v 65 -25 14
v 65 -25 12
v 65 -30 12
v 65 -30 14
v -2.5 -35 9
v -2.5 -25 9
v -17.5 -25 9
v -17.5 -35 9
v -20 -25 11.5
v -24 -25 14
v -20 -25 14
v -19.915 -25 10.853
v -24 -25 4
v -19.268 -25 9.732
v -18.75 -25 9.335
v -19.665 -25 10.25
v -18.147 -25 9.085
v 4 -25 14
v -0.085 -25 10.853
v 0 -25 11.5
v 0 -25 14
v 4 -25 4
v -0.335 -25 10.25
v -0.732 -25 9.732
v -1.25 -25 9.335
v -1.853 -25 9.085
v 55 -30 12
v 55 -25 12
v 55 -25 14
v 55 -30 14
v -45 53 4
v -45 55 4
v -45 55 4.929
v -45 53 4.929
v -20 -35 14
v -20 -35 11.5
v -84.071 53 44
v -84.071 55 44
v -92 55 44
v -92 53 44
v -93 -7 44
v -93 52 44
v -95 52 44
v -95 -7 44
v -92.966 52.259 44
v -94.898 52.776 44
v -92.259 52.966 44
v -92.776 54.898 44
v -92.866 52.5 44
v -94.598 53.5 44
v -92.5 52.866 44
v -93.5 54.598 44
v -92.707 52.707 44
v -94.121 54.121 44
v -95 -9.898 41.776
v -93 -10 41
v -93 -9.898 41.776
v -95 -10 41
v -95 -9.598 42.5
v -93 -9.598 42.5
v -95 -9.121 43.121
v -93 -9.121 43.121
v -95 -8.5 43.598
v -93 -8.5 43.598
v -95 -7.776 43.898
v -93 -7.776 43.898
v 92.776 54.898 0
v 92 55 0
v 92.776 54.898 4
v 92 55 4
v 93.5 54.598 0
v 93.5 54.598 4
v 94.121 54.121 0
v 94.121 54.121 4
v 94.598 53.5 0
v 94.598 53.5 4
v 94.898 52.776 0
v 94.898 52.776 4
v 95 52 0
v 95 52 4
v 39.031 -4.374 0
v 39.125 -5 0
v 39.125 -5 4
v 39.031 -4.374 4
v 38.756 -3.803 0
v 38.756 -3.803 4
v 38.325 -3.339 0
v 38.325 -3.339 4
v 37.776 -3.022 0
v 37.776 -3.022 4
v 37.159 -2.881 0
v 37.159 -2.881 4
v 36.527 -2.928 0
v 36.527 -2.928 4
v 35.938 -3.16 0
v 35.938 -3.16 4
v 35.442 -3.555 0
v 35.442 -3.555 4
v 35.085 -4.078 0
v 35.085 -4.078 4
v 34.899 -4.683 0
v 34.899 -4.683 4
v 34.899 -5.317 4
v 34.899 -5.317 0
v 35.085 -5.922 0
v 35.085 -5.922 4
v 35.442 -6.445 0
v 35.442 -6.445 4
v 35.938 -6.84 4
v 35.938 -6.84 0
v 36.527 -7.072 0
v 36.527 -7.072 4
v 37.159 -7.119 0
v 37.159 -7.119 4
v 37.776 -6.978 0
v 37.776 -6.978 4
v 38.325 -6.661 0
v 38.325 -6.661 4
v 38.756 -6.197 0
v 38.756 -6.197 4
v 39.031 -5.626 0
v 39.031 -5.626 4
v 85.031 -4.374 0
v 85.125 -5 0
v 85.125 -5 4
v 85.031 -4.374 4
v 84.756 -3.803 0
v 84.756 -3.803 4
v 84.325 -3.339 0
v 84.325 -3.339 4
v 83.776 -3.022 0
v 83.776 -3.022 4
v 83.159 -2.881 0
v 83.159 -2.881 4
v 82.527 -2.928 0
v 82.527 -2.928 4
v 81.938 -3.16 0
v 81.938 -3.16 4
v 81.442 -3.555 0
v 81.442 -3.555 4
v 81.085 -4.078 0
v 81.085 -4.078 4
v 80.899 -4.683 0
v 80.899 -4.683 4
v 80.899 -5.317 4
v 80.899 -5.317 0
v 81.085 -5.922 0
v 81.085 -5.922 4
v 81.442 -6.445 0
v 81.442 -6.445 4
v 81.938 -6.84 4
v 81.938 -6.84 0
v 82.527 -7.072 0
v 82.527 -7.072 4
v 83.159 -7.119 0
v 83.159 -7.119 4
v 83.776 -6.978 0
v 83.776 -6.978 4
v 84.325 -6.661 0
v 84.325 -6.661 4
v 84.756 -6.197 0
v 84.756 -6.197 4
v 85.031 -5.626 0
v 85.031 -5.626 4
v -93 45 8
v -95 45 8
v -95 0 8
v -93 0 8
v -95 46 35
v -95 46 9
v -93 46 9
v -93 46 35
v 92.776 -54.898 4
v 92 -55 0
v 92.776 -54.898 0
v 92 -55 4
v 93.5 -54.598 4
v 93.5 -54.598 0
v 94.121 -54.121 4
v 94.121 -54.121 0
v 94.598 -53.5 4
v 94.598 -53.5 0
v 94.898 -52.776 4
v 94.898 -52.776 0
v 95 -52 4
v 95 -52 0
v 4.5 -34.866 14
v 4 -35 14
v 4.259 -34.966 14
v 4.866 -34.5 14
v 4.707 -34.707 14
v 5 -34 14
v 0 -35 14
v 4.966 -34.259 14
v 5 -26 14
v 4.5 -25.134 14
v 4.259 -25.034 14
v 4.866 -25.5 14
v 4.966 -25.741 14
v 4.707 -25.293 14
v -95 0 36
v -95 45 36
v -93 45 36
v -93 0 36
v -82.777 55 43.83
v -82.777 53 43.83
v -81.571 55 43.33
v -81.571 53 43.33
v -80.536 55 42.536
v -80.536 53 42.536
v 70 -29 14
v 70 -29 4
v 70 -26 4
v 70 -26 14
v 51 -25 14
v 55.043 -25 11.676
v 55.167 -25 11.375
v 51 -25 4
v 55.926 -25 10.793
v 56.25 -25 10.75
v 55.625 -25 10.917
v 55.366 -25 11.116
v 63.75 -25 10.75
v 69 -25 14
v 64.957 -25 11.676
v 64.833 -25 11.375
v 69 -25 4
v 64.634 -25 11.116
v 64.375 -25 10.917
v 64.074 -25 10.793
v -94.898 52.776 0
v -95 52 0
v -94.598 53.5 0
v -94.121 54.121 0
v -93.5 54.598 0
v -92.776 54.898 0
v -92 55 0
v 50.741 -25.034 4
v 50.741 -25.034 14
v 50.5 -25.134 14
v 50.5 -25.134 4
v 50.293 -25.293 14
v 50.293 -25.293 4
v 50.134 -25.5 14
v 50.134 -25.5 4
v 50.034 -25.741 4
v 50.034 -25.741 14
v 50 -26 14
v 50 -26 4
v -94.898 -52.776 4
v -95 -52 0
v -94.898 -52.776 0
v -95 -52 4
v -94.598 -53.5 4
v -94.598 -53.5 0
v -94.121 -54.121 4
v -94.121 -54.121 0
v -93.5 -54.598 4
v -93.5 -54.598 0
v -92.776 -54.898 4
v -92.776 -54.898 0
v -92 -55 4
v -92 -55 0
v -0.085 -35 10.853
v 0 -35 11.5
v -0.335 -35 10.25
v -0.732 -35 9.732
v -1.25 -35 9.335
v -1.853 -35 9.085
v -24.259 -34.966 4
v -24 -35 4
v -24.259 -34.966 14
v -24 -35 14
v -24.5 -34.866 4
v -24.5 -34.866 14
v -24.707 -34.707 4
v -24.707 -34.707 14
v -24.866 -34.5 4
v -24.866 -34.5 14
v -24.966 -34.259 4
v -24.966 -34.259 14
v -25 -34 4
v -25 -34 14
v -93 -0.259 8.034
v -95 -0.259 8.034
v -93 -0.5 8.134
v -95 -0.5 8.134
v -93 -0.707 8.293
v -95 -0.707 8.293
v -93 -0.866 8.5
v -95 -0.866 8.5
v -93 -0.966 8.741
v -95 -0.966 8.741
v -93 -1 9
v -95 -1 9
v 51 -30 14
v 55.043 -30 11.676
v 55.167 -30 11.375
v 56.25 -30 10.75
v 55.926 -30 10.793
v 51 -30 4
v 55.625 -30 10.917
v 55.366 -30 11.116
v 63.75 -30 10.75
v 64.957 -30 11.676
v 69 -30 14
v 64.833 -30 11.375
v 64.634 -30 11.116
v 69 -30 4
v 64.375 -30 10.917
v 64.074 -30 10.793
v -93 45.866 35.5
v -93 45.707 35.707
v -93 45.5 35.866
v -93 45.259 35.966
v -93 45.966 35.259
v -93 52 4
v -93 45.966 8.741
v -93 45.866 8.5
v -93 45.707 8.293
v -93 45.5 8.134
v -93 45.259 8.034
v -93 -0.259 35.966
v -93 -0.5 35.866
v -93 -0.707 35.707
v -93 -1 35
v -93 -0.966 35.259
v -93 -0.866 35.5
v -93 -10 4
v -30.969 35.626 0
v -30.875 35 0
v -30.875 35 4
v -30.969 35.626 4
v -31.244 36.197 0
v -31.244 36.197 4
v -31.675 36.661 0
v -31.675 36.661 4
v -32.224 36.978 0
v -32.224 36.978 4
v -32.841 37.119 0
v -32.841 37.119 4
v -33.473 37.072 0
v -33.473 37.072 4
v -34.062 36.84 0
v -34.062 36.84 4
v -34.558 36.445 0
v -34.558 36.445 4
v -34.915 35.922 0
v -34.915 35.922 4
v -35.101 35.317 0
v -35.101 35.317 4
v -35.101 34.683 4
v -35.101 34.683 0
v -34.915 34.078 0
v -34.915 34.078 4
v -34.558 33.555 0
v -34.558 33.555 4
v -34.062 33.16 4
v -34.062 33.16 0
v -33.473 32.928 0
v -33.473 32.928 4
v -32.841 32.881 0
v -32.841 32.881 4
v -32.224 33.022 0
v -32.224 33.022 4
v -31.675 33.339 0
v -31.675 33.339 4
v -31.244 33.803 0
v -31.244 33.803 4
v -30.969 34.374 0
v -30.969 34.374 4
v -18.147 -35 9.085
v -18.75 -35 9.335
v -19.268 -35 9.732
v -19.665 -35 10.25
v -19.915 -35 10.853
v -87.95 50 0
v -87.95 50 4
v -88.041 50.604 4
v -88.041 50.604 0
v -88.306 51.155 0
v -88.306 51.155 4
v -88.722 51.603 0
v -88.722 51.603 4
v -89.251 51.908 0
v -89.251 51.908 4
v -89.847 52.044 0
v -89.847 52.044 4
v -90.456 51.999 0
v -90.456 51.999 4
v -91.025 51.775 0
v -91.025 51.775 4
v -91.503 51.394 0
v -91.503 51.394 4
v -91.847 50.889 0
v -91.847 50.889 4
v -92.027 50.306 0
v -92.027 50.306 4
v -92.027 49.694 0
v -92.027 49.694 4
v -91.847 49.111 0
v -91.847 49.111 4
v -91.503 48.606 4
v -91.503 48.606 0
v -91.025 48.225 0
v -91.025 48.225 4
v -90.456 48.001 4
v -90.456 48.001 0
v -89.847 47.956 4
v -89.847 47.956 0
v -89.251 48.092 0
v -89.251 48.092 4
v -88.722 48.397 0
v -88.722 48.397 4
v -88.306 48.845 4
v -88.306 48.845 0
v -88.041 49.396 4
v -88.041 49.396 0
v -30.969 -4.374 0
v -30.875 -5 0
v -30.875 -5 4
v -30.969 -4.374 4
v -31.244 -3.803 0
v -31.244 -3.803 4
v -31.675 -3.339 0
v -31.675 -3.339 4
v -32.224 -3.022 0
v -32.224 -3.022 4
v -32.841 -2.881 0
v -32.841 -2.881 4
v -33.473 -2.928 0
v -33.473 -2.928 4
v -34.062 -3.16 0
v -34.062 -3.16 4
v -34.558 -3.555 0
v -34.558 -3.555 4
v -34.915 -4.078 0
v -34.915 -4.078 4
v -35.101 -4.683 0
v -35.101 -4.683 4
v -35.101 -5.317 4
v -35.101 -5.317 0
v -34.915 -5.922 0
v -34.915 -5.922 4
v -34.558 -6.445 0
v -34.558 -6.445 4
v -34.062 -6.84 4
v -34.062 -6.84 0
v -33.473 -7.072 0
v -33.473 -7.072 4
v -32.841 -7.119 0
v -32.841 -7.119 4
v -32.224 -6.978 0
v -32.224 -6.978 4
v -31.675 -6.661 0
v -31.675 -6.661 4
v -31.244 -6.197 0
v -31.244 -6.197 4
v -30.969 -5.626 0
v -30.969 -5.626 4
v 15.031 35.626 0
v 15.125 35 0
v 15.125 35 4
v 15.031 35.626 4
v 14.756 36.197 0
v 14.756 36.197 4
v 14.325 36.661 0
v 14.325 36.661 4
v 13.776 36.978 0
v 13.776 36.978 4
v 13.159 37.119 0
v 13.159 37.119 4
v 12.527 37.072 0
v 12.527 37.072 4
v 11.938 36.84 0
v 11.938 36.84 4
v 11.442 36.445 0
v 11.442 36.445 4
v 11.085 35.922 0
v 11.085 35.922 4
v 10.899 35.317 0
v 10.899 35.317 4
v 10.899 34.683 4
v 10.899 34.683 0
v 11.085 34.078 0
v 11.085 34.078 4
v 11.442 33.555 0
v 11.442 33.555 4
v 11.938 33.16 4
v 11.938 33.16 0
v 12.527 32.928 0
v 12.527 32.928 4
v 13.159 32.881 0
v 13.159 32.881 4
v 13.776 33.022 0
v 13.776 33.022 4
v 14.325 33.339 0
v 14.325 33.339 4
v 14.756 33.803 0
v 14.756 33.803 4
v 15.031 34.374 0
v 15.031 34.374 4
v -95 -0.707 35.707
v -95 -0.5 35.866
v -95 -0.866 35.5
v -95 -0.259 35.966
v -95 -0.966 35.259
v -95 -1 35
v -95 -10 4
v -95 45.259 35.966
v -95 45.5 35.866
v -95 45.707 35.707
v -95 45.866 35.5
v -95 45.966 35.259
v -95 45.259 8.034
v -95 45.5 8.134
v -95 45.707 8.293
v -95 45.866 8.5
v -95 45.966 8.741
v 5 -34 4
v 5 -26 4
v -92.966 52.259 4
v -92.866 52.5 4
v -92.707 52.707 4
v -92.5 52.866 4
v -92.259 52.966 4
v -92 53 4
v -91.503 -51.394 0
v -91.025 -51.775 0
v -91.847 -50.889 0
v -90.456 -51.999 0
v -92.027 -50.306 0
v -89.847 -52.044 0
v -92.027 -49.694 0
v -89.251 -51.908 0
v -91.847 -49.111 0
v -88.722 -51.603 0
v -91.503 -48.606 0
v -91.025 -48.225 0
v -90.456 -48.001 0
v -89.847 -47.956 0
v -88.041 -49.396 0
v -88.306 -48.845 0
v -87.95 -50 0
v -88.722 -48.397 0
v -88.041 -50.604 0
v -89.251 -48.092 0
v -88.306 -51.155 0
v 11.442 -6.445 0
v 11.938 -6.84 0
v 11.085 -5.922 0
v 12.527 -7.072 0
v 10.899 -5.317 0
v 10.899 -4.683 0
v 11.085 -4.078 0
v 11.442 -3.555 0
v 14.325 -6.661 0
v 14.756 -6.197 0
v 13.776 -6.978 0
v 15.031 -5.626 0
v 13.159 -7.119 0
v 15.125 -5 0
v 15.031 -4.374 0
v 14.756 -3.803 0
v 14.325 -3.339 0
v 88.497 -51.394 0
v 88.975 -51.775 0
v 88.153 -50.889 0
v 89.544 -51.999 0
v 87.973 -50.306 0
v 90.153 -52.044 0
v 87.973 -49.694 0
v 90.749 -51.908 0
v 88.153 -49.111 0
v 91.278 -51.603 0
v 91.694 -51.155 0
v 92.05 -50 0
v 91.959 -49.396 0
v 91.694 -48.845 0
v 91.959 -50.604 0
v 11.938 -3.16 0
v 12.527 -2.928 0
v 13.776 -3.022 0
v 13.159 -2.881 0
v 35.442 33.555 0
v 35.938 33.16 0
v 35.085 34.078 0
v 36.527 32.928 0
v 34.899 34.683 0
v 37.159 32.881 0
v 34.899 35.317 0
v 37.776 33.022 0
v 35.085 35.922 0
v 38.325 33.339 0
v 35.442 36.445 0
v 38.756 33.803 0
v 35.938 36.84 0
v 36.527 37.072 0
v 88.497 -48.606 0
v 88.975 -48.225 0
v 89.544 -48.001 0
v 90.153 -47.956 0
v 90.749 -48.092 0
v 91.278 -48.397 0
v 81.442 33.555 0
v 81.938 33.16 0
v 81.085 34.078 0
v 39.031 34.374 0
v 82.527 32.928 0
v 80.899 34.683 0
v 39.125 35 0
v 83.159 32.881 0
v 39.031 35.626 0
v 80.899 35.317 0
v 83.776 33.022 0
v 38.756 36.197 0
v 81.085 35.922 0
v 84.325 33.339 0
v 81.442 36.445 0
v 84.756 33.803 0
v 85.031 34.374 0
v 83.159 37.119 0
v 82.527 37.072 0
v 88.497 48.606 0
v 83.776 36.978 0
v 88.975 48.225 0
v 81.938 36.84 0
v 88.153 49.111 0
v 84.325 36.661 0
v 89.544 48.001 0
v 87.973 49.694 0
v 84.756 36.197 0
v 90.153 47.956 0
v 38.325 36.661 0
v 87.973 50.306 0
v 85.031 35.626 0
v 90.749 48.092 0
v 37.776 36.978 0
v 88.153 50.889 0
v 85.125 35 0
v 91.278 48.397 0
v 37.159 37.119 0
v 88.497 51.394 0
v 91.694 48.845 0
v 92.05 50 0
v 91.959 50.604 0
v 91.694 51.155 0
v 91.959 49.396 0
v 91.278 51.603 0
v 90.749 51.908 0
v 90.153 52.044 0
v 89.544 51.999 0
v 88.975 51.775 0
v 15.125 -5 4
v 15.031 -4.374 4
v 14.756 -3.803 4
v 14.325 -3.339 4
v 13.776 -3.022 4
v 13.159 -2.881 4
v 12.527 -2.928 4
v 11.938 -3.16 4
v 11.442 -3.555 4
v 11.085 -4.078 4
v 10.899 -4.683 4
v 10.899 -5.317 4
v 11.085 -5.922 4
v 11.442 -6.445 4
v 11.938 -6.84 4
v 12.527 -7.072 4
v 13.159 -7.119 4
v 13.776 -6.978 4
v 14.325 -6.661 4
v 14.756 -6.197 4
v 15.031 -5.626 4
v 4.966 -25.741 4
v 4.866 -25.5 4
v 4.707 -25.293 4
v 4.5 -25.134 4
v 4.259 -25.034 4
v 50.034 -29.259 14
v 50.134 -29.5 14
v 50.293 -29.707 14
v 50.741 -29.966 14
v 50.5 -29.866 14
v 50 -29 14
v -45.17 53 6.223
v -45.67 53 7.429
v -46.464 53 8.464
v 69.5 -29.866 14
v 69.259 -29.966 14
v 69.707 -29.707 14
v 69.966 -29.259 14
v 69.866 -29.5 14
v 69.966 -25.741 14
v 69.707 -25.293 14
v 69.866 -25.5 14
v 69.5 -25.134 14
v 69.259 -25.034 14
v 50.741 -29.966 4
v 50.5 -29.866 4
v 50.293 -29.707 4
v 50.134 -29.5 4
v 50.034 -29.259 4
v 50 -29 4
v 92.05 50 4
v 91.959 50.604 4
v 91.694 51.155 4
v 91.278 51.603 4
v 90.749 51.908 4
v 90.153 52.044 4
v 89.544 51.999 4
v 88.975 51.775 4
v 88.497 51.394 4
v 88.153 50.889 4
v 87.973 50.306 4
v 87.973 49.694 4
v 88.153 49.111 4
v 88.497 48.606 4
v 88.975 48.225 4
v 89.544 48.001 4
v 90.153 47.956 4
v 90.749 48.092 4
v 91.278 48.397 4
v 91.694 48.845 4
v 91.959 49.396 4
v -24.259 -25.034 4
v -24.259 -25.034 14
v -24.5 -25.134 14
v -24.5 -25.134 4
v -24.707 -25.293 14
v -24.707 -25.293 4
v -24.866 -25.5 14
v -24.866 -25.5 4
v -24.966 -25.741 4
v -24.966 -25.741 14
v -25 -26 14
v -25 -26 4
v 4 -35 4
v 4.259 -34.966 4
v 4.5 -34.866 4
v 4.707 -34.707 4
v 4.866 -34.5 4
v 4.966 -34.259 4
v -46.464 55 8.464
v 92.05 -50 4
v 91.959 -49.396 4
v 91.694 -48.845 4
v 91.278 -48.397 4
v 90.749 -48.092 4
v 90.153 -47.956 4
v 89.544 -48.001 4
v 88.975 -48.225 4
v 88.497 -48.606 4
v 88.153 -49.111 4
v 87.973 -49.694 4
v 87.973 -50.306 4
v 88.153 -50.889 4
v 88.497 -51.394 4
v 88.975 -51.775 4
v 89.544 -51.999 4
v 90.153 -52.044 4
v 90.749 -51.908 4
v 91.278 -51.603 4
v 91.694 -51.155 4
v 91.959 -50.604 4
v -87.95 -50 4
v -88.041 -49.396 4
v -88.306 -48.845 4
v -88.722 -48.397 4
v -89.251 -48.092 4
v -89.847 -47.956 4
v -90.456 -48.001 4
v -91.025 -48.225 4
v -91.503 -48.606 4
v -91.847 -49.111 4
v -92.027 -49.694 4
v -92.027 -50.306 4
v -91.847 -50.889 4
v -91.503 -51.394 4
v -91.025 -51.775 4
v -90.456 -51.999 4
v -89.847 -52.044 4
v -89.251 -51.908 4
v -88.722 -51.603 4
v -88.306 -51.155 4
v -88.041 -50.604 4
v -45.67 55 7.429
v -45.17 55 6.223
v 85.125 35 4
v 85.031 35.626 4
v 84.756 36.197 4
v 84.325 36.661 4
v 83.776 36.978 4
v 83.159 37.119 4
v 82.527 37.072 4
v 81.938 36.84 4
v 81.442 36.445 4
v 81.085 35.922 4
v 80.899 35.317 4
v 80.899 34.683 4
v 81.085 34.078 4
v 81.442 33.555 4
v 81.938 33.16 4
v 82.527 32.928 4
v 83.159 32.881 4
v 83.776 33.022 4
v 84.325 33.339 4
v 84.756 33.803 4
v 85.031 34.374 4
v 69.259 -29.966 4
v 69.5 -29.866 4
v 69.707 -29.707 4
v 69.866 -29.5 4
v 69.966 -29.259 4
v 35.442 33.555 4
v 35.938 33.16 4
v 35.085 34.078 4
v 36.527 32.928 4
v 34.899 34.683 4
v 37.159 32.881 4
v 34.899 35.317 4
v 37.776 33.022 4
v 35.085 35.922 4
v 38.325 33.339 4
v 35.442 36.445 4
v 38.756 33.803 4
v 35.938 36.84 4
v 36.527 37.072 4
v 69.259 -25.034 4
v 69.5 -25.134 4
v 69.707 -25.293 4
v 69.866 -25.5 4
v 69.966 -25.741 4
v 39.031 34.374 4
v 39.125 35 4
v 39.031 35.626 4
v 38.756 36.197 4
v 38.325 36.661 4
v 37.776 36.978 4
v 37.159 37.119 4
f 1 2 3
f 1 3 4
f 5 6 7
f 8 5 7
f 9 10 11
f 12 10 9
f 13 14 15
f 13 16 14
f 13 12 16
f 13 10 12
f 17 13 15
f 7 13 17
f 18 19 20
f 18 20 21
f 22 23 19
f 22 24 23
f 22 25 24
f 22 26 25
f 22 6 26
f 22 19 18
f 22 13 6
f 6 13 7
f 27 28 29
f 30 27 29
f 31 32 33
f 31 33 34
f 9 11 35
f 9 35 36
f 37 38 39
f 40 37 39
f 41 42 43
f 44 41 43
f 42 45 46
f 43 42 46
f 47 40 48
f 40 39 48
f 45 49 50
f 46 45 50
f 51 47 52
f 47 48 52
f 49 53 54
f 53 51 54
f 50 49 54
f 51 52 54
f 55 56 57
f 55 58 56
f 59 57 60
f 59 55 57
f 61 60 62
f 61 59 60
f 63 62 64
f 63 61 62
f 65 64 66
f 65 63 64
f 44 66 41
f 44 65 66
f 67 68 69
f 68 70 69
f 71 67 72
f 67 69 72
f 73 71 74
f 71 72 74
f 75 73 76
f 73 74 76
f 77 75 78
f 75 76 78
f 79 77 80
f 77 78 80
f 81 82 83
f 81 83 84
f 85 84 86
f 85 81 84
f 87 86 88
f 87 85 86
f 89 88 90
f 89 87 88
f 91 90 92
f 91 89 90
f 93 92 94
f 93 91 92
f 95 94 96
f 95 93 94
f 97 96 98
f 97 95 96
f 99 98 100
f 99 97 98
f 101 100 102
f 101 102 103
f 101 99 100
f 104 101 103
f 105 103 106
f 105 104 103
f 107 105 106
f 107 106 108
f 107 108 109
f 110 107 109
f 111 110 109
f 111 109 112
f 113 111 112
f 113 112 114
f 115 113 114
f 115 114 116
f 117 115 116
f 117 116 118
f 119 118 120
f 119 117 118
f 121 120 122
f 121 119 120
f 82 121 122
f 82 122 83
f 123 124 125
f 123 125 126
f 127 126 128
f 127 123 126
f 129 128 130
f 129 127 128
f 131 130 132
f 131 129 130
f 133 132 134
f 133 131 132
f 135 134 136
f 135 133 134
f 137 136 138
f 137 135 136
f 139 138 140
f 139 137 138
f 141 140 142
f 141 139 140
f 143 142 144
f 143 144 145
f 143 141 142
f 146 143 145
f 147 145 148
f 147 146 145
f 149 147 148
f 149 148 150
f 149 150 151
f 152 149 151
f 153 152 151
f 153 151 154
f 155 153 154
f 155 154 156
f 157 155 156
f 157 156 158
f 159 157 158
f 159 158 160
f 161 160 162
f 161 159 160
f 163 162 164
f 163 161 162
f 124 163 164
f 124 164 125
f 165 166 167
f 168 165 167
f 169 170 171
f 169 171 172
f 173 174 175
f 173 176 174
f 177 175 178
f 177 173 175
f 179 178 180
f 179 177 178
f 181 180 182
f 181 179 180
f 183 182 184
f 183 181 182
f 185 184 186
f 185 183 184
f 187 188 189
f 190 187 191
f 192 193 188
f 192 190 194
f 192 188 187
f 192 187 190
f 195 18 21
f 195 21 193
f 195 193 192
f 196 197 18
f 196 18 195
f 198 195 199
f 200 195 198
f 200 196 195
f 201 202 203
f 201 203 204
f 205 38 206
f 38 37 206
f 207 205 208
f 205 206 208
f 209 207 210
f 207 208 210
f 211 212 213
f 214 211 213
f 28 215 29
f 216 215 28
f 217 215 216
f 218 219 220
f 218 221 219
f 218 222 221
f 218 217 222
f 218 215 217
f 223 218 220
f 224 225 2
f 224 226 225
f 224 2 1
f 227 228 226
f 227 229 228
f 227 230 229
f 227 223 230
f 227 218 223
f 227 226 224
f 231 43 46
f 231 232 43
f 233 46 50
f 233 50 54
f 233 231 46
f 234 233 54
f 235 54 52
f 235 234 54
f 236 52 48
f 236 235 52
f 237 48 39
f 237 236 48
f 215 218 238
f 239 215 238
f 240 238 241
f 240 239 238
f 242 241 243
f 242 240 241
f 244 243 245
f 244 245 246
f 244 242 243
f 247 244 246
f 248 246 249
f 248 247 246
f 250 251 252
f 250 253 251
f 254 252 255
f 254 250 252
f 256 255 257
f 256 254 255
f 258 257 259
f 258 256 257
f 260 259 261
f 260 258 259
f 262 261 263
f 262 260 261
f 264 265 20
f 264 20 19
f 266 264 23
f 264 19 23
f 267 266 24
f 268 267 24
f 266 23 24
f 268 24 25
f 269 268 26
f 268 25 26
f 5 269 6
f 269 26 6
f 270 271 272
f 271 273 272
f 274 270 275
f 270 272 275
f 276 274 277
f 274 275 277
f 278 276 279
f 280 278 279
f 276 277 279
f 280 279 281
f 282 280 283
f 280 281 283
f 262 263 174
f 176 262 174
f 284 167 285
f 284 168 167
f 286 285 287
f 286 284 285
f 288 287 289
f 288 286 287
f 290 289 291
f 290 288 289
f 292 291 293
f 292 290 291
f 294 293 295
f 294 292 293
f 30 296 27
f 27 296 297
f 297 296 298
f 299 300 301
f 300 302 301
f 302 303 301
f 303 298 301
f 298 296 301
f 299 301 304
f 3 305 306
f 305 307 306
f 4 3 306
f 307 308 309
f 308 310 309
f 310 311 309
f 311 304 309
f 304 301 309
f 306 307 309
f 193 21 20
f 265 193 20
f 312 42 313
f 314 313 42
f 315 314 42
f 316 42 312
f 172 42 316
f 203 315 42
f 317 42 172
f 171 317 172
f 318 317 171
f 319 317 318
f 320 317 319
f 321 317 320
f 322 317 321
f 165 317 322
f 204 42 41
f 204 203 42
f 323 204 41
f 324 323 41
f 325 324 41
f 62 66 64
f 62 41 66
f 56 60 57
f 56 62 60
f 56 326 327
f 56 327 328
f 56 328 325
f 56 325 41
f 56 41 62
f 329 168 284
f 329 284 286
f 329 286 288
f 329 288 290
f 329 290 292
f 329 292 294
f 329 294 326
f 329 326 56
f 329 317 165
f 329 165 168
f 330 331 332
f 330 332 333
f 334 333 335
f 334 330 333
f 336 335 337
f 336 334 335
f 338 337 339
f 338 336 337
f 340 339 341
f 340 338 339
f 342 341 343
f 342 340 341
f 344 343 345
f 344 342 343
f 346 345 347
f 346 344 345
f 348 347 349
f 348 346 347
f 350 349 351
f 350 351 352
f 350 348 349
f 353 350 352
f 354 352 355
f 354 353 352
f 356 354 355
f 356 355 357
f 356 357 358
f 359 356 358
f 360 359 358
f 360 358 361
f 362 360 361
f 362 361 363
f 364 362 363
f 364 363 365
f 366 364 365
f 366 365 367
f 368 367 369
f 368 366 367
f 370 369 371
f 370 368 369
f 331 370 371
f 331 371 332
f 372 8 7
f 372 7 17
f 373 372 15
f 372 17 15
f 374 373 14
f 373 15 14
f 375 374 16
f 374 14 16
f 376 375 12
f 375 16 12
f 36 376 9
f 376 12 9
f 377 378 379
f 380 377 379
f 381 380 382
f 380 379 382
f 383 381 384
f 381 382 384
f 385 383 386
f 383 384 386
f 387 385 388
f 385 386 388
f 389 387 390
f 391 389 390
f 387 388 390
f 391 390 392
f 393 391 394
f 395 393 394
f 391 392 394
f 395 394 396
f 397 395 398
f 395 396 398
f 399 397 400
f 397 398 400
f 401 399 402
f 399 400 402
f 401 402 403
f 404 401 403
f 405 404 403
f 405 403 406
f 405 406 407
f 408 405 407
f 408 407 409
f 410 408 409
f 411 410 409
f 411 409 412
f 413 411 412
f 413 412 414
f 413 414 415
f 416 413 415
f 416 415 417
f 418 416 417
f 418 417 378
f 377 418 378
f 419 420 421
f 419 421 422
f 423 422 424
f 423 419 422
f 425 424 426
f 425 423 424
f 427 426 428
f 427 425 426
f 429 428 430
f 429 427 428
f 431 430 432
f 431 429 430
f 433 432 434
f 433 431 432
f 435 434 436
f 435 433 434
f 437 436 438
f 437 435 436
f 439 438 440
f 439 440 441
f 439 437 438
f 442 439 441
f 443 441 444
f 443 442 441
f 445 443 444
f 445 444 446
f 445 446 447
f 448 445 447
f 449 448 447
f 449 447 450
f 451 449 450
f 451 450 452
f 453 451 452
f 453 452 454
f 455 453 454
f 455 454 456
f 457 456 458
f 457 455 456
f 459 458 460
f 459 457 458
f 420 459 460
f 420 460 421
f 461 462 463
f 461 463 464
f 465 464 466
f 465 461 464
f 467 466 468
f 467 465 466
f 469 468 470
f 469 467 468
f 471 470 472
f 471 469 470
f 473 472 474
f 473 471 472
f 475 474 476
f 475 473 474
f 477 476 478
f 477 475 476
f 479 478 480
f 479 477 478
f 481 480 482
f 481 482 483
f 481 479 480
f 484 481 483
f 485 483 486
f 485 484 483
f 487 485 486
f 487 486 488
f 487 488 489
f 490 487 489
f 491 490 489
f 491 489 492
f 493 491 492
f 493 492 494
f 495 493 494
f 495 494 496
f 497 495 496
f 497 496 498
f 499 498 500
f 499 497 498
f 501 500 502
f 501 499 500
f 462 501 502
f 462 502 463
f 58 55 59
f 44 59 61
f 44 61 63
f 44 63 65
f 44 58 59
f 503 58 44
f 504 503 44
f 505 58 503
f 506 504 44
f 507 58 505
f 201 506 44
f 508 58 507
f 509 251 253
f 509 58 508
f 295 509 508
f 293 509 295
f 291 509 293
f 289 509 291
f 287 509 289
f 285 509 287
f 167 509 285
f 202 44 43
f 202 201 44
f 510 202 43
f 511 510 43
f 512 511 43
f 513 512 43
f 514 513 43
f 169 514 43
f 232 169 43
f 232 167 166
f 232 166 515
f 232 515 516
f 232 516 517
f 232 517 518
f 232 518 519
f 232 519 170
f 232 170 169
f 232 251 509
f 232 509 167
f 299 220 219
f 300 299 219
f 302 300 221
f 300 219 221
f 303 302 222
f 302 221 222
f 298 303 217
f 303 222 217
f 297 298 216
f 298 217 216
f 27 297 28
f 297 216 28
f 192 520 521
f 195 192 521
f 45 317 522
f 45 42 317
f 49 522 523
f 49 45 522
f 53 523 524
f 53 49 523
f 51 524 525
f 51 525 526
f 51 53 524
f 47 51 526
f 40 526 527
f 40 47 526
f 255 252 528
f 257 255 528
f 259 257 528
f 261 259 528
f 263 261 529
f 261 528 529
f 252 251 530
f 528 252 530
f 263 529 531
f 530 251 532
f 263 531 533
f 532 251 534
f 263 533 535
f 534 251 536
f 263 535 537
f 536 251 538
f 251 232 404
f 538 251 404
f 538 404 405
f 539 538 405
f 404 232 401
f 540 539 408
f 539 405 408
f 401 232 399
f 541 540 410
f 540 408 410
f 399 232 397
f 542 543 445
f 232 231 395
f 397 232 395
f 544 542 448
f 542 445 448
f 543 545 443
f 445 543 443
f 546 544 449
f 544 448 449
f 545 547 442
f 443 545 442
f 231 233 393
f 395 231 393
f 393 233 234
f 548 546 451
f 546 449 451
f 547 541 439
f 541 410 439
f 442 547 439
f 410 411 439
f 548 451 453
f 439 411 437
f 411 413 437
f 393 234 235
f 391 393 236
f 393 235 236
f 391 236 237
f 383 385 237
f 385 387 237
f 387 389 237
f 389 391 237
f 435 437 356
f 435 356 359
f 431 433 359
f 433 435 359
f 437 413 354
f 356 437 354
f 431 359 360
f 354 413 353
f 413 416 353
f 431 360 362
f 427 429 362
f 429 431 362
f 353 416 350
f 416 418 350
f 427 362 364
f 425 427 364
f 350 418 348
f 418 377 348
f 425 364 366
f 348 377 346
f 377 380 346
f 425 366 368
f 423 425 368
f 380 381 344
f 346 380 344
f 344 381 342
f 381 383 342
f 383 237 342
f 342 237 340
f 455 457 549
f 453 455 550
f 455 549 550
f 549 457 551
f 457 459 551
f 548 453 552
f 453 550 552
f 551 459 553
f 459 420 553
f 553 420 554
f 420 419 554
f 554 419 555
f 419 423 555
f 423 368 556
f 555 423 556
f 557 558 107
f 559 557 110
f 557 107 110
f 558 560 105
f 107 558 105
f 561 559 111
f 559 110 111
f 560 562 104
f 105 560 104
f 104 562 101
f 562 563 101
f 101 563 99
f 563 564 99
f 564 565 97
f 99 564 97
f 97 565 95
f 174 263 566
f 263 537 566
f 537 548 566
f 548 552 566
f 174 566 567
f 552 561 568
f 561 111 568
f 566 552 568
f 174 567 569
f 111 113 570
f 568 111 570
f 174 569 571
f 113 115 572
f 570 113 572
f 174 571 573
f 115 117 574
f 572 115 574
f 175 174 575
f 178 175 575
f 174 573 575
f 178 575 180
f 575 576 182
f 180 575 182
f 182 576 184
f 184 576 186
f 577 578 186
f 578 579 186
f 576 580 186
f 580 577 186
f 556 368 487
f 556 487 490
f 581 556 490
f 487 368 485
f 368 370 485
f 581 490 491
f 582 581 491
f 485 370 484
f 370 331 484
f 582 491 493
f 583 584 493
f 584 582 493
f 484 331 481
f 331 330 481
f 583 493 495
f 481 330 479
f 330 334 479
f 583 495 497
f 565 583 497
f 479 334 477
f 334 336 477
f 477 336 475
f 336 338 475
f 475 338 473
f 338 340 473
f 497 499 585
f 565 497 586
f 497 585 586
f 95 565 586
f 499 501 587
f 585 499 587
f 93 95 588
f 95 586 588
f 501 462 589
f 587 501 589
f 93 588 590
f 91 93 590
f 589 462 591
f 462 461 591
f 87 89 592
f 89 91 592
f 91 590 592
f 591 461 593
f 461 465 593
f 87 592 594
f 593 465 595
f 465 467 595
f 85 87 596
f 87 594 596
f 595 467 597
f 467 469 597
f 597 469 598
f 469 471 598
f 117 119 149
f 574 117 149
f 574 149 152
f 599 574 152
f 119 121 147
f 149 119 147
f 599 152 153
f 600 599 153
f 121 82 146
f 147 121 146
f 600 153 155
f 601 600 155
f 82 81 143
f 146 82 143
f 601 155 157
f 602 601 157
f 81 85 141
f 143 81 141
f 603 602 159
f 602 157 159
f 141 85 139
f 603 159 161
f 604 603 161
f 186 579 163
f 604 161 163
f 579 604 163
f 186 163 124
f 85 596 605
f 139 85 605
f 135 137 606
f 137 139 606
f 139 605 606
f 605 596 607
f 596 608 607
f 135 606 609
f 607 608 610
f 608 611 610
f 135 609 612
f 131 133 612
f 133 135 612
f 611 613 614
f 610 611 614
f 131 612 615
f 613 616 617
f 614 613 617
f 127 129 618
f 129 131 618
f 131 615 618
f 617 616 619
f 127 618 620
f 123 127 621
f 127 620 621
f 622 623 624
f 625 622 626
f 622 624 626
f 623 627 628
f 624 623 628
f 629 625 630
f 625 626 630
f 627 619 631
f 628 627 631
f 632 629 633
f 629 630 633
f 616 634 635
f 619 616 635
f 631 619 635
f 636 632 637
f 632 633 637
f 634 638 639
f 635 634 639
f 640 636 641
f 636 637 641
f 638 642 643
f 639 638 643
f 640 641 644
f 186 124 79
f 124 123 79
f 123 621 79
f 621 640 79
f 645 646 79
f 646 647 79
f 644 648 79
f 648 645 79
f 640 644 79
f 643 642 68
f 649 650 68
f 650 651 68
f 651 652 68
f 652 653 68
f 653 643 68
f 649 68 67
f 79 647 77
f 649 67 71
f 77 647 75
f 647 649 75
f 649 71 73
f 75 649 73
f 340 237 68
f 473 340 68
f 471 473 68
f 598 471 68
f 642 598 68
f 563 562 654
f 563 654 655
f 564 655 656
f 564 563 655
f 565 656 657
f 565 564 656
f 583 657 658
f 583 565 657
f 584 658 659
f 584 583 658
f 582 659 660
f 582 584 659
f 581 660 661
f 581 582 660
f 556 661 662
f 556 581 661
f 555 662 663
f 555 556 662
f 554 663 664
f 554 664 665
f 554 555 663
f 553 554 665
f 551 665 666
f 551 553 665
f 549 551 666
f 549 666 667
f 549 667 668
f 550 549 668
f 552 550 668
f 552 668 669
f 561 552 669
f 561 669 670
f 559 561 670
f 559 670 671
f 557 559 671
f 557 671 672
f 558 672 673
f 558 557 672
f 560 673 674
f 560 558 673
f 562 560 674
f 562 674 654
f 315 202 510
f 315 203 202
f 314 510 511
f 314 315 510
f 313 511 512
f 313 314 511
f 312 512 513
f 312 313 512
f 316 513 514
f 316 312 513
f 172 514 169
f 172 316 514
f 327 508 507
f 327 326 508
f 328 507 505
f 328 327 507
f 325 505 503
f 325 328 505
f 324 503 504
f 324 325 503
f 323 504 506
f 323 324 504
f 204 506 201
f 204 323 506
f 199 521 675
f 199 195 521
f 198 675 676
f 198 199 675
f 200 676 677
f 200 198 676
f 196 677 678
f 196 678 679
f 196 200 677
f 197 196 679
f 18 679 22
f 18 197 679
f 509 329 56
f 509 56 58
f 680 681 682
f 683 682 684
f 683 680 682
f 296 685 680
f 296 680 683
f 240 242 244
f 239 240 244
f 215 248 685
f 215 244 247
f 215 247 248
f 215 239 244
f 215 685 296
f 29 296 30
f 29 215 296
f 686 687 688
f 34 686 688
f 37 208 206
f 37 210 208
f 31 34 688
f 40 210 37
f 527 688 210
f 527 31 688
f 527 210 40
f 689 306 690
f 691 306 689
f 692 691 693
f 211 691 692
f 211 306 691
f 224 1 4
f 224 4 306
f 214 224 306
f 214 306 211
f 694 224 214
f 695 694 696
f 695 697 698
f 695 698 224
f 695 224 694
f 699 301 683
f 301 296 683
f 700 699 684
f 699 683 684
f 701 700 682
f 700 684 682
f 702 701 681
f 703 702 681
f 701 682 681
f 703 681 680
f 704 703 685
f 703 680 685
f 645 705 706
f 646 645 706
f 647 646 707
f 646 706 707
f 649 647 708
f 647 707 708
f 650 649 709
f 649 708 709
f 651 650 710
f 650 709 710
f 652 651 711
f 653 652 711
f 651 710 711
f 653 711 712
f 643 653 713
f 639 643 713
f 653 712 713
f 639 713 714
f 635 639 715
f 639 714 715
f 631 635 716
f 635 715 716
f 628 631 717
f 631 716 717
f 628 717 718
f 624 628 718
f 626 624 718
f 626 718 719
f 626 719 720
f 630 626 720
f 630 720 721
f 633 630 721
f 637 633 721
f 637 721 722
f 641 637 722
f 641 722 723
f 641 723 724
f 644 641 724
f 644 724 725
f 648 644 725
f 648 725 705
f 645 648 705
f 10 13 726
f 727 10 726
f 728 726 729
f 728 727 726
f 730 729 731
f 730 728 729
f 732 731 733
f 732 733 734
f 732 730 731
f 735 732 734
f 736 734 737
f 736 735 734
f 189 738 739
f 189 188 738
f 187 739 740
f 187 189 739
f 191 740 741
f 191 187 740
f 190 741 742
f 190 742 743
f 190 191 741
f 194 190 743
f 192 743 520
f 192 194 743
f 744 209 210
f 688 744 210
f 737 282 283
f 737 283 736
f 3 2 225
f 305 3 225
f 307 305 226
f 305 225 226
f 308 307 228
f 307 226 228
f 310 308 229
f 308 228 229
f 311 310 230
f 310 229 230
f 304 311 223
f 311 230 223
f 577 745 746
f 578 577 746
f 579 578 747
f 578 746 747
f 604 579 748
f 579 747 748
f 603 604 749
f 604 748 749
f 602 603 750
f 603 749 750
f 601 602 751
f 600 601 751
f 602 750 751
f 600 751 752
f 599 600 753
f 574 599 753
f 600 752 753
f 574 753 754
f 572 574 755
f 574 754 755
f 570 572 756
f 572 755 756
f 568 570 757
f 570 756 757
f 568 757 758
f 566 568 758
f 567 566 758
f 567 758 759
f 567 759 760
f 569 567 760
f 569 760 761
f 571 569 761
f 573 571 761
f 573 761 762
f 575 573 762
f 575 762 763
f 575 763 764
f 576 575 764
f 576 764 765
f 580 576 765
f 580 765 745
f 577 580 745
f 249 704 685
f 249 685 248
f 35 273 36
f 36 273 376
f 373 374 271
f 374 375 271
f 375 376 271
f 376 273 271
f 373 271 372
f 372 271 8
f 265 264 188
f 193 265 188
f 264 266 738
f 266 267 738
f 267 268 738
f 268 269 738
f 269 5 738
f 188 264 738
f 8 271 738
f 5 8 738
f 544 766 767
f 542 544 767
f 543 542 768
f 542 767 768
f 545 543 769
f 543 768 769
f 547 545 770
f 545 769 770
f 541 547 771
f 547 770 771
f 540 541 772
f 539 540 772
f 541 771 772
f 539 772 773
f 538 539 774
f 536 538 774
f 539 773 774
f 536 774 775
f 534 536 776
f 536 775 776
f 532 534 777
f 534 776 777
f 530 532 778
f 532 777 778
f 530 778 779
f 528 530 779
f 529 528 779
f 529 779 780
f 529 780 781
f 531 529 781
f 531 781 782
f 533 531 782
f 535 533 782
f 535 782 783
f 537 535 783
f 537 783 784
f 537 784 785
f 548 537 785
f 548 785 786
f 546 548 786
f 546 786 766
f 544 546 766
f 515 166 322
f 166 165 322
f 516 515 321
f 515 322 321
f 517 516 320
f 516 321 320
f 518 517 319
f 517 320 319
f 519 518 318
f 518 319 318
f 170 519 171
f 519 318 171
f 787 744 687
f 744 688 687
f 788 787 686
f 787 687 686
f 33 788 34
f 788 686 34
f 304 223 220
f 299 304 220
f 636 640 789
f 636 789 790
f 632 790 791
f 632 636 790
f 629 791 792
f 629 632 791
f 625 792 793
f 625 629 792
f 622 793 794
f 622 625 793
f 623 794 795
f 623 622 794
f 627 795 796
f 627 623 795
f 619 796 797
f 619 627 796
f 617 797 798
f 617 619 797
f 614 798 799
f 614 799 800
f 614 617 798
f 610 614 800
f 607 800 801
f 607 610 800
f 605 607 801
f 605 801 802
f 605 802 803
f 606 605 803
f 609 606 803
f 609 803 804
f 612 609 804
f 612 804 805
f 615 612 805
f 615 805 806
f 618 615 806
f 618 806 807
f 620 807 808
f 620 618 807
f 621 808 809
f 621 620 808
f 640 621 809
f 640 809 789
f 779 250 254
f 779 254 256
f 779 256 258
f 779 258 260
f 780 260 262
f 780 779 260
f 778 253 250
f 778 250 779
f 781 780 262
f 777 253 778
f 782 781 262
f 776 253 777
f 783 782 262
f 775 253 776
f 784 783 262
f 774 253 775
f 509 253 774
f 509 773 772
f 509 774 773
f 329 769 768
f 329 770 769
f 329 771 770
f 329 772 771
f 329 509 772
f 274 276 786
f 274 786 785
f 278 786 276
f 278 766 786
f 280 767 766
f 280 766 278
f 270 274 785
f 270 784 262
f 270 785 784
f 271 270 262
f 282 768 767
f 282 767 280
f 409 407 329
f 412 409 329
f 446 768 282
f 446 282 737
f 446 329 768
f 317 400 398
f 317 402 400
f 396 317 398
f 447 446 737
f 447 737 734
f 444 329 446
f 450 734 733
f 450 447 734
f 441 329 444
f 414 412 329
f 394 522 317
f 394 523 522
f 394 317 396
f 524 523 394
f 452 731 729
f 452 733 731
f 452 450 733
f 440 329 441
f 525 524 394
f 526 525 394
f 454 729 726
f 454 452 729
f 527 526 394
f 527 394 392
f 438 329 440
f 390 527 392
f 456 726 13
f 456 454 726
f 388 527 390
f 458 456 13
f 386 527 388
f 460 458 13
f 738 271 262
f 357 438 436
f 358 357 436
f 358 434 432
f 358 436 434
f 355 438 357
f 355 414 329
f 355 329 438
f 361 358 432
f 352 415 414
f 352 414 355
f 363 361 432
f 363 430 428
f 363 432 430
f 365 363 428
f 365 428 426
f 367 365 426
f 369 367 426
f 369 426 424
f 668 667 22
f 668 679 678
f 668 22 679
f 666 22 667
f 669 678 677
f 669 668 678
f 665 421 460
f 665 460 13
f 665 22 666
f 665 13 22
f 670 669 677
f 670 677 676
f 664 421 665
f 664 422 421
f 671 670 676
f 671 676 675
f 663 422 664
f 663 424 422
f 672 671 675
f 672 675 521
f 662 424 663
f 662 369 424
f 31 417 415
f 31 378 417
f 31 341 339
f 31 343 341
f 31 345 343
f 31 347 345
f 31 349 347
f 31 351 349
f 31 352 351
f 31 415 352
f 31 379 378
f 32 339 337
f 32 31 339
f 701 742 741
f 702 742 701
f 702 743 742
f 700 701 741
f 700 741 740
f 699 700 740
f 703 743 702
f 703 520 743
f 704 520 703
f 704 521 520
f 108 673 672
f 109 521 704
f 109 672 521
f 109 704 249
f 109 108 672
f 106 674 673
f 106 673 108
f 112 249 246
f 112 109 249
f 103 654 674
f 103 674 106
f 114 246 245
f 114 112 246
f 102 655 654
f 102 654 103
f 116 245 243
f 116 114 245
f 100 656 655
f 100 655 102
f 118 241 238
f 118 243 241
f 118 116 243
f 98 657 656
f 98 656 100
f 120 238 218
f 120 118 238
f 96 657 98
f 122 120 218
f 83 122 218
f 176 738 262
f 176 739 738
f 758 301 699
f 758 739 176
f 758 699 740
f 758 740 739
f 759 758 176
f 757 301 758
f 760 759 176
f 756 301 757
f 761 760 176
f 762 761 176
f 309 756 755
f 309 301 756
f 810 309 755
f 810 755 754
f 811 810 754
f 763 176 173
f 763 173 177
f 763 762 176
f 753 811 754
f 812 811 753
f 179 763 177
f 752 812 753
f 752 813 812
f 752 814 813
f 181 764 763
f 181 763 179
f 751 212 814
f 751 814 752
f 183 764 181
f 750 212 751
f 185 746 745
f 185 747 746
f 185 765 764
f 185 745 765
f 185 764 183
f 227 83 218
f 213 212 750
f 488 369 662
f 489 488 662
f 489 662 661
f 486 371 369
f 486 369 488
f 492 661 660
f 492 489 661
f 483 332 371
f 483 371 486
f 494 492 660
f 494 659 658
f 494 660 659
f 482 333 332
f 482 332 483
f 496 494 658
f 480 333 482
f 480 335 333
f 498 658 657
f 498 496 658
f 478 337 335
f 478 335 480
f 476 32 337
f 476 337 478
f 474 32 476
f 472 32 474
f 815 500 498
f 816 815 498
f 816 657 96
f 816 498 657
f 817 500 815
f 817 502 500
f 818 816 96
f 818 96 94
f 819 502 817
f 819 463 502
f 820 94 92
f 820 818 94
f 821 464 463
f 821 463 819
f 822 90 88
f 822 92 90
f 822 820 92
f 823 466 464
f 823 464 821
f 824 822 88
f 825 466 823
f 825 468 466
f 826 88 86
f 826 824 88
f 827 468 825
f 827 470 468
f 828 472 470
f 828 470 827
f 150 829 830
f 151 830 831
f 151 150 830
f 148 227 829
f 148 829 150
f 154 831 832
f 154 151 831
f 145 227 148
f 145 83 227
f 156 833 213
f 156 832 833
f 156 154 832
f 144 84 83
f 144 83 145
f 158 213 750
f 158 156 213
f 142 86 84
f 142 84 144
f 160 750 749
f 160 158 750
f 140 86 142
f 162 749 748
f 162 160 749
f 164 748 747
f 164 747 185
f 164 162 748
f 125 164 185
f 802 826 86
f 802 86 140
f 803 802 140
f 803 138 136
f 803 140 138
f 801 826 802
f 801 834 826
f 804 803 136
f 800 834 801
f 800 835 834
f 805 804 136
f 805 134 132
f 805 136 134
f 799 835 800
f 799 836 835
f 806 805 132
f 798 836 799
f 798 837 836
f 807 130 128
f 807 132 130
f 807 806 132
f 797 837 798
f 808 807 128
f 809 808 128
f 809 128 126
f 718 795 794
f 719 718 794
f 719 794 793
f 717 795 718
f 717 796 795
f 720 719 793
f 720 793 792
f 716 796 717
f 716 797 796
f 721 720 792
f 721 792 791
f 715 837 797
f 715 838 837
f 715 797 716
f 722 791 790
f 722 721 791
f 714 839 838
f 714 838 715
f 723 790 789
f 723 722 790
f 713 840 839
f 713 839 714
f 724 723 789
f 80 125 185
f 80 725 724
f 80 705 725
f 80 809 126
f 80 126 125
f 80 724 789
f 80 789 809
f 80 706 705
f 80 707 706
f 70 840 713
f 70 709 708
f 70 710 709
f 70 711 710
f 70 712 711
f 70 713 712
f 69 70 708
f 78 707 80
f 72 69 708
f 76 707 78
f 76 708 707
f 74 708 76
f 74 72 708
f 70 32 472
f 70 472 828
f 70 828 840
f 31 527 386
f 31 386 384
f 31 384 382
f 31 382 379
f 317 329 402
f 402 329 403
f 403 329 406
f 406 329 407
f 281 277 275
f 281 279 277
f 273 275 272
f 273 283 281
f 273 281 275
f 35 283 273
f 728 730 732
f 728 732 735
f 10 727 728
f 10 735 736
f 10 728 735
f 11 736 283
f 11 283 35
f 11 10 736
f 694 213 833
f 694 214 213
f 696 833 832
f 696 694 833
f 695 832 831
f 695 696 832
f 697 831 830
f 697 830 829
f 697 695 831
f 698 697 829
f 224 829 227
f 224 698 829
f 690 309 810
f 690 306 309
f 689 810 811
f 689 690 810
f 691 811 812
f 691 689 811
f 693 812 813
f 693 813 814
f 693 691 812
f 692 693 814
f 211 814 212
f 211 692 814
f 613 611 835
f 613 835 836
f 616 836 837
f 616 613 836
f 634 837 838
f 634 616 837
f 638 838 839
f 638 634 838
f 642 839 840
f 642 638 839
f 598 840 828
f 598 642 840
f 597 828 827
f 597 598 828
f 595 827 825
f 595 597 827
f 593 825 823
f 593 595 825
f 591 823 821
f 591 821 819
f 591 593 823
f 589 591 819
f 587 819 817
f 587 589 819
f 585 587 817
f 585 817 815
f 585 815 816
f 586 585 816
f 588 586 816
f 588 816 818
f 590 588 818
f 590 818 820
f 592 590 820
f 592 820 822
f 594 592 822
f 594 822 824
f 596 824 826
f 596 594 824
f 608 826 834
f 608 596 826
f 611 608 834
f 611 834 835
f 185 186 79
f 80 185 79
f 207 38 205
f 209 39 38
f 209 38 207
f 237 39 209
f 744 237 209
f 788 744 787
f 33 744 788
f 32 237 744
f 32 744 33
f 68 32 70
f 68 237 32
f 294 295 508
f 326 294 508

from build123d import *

# Parameters (mm, degrees)
SKETCH_W        = 190
SKETCH_H        = 110
SKETCH_R        = 2.125
PAD_DEPTH       = 4
PAD001_DEPTH    = 40
SKETCH002_R     = 2.05
POCKET_DEPTH    = 4.001
SKETCH003_W     = 30
SKETCH003_H     = 10
SKETCH003_W_2   = 20
SKETCH003_H_2   = 5
PAD002_DEPTH    = 10
POCKET001_DEPTH = 30.001
SKETCH005_W     = 47
SKETCH005_H     = 28
POCKET002_DEPTH = 5
FILLET_R        = 1
FILLET001_R     = 3
FILLET002_R     = 1
FILLET003_R     = 3
CHAMFER_SIZE    = 37
FILLET004_R     = 5
FILLET005_R     = 1


with BuildPart() as part:
    # Sketch → Pad (new body)
    with BuildSketch(Plane.XY):
        Rectangle(SKETCH_W, SKETCH_H)
        with Locations((-33, 35)):
            Circle(SKETCH_R, mode=Mode.SUBTRACT)
        with Locations((-33, -5)):
            Circle(SKETCH_R, mode=Mode.SUBTRACT)
        with Locations((13, -5)):
            Circle(SKETCH_R, mode=Mode.SUBTRACT)
        with Locations((13, 35)):
            Circle(SKETCH_R, mode=Mode.SUBTRACT)
        with Locations((37, 35)):
            Circle(SKETCH_R, mode=Mode.SUBTRACT)
        with Locations((37, -5)):
            Circle(SKETCH_R, mode=Mode.SUBTRACT)
        with Locations((83, -5)):
            Circle(SKETCH_R, mode=Mode.SUBTRACT)
        with Locations((83, 35)):
            Circle(SKETCH_R, mode=Mode.SUBTRACT)
    extrude(amount=PAD_DEPTH)

    # Sketch001 (on Face14 of Pad) → Pad001 (join)
    with BuildSketch(Plane.XY.offset(4)):
        Polygon((-95, -10), (-95, 55), (-45, 55), (-45, 53), (-93, 53), (-93, -10), align=None)
    extrude(amount=PAD001_DEPTH)

    # Sketch002 (on Face6 of Pad001) → Pocket (cut, through all)
    with BuildSketch(Plane.XY.offset(4)):
        with Locations((-90, 50)):
            Circle(SKETCH002_R)
        with Locations((-90, -50)):
            Circle(SKETCH002_R)
        with Locations((90, -50)):
            Circle(SKETCH002_R)
        with Locations((90, 50)):
            Circle(SKETCH002_R)
    extrude(amount=-POCKET_DEPTH, mode=Mode.SUBTRACT)

    # Sketch003 (on Face6 of Pocket) → Pad002 (join)
    with BuildSketch(Plane.XY.offset(4)):
        with Locations((-10, -30)):
            Rectangle(SKETCH003_W, SKETCH003_H)
        with Locations((60, -27.5)):
            Rectangle(SKETCH003_W_2, SKETCH003_H_2)
    extrude(amount=PAD002_DEPTH)

    # Sketch004 (on Face30 of Pad002) → Pocket001 (cut, through all)
    with BuildSketch(Plane(origin=(0, -25, 0), x_dir=(-1, 0, 0), z_dir=(0, 1, 0))):
        with BuildLine():
            Line((0, 14), (20, 14))
            Line((20, 14), (20, 11.5))
            ThreePointArc((17.5, 9), (19.267767, 9.732233), (20, 11.5))
            Line((2.5, 9), (17.5, 9))
            ThreePointArc((0, 11.5), (0.732233, 9.732233), (2.5, 9))
            Line((0, 14), (0, 11.5))
        make_face()
        with BuildLine():
            Line((-65, 14), (-55, 14))
            Line((-55, 12), (-55, 14))
            ThreePointArc((-56.25, 10.75), (-55.366117, 11.116117), (-55, 12))
            Line((-63.75, 10.75), (-56.25, 10.75))
            ThreePointArc((-65, 12), (-64.633883, 11.116117), (-63.75, 10.75))
            Line((-65, 12), (-65, 14))
        make_face()
    extrude(amount=-POCKET001_DEPTH, mode=Mode.SUBTRACT)

    # Sketch005 (on Face8 of Pocket001) → Pocket002 (cut)
    with BuildSketch(Plane(origin=(-95, 0, 0), x_dir=(0, -1, 0), z_dir=(-1, 0, 0))):
        with Locations((-22.5, 22)):
            Rectangle(SKETCH005_W, SKETCH005_H)
    extrude(amount=-POCKET002_DEPTH, mode=Mode.SUBTRACT)

    # Fillet
    fillet_edges = [part.edges().sort_by_distance(p)[0] for p in [
        (-93, 53, 24),
    ]]
    fillet(fillet_edges, radius=FILLET_R)

    # Fillet001
    fillet001_edges = [part.edges().sort_by_distance(p)[0] for p in [
        (-95, 55, 24),
        (-95, -55, 2),
        (95, -55, 2),
        (95, 55, 2),
    ]]
    fillet(fillet001_edges, radius=FILLET001_R)

    # Fillet002
    fillet002_edges = [part.edges().sort_by_distance(p)[0] for p in [
        (-25, -25, 9),
        (-25, -35, 9),
        (5, -35, 9),
        (50, -25, 9),
        (50, -30, 9),
        (70, -30, 9),
        (70, -25, 9),
        (5, -25, 9),
    ]]
    fillet(fillet002_edges, radius=FILLET002_R)

    # Fillet003
    fillet003_edges = [part.edges().sort_by_distance(p)[0] for p in [
        (-94, -10, 44),
    ]]
    fillet(fillet003_edges, radius=FILLET003_R)

    # Chamfer
    chamfer_edges = [part.edges().sort_by_distance(p)[0] for p in [
        (-45, 54, 44),
    ]]
    chamfer(chamfer_edges, length=CHAMFER_SIZE)

    # Fillet004
    fillet004_edges = [part.edges().sort_by_distance(p)[0] for p in [
        (-45, 54, 7),
        (-82, 54, 44),
    ]]
    fillet(fillet004_edges, radius=FILLET004_R)

    # Fillet005
    fillet005_edges = [part.edges().sort_by_distance(p)[0] for p in [
        (-94, 46, 8),
        (-94, 46, 36),
        (-94, -1, 36),
        (-94, -1, 8),
    ]]
    fillet(fillet005_edges, radius=FILLET005_R)


solid = part.part
